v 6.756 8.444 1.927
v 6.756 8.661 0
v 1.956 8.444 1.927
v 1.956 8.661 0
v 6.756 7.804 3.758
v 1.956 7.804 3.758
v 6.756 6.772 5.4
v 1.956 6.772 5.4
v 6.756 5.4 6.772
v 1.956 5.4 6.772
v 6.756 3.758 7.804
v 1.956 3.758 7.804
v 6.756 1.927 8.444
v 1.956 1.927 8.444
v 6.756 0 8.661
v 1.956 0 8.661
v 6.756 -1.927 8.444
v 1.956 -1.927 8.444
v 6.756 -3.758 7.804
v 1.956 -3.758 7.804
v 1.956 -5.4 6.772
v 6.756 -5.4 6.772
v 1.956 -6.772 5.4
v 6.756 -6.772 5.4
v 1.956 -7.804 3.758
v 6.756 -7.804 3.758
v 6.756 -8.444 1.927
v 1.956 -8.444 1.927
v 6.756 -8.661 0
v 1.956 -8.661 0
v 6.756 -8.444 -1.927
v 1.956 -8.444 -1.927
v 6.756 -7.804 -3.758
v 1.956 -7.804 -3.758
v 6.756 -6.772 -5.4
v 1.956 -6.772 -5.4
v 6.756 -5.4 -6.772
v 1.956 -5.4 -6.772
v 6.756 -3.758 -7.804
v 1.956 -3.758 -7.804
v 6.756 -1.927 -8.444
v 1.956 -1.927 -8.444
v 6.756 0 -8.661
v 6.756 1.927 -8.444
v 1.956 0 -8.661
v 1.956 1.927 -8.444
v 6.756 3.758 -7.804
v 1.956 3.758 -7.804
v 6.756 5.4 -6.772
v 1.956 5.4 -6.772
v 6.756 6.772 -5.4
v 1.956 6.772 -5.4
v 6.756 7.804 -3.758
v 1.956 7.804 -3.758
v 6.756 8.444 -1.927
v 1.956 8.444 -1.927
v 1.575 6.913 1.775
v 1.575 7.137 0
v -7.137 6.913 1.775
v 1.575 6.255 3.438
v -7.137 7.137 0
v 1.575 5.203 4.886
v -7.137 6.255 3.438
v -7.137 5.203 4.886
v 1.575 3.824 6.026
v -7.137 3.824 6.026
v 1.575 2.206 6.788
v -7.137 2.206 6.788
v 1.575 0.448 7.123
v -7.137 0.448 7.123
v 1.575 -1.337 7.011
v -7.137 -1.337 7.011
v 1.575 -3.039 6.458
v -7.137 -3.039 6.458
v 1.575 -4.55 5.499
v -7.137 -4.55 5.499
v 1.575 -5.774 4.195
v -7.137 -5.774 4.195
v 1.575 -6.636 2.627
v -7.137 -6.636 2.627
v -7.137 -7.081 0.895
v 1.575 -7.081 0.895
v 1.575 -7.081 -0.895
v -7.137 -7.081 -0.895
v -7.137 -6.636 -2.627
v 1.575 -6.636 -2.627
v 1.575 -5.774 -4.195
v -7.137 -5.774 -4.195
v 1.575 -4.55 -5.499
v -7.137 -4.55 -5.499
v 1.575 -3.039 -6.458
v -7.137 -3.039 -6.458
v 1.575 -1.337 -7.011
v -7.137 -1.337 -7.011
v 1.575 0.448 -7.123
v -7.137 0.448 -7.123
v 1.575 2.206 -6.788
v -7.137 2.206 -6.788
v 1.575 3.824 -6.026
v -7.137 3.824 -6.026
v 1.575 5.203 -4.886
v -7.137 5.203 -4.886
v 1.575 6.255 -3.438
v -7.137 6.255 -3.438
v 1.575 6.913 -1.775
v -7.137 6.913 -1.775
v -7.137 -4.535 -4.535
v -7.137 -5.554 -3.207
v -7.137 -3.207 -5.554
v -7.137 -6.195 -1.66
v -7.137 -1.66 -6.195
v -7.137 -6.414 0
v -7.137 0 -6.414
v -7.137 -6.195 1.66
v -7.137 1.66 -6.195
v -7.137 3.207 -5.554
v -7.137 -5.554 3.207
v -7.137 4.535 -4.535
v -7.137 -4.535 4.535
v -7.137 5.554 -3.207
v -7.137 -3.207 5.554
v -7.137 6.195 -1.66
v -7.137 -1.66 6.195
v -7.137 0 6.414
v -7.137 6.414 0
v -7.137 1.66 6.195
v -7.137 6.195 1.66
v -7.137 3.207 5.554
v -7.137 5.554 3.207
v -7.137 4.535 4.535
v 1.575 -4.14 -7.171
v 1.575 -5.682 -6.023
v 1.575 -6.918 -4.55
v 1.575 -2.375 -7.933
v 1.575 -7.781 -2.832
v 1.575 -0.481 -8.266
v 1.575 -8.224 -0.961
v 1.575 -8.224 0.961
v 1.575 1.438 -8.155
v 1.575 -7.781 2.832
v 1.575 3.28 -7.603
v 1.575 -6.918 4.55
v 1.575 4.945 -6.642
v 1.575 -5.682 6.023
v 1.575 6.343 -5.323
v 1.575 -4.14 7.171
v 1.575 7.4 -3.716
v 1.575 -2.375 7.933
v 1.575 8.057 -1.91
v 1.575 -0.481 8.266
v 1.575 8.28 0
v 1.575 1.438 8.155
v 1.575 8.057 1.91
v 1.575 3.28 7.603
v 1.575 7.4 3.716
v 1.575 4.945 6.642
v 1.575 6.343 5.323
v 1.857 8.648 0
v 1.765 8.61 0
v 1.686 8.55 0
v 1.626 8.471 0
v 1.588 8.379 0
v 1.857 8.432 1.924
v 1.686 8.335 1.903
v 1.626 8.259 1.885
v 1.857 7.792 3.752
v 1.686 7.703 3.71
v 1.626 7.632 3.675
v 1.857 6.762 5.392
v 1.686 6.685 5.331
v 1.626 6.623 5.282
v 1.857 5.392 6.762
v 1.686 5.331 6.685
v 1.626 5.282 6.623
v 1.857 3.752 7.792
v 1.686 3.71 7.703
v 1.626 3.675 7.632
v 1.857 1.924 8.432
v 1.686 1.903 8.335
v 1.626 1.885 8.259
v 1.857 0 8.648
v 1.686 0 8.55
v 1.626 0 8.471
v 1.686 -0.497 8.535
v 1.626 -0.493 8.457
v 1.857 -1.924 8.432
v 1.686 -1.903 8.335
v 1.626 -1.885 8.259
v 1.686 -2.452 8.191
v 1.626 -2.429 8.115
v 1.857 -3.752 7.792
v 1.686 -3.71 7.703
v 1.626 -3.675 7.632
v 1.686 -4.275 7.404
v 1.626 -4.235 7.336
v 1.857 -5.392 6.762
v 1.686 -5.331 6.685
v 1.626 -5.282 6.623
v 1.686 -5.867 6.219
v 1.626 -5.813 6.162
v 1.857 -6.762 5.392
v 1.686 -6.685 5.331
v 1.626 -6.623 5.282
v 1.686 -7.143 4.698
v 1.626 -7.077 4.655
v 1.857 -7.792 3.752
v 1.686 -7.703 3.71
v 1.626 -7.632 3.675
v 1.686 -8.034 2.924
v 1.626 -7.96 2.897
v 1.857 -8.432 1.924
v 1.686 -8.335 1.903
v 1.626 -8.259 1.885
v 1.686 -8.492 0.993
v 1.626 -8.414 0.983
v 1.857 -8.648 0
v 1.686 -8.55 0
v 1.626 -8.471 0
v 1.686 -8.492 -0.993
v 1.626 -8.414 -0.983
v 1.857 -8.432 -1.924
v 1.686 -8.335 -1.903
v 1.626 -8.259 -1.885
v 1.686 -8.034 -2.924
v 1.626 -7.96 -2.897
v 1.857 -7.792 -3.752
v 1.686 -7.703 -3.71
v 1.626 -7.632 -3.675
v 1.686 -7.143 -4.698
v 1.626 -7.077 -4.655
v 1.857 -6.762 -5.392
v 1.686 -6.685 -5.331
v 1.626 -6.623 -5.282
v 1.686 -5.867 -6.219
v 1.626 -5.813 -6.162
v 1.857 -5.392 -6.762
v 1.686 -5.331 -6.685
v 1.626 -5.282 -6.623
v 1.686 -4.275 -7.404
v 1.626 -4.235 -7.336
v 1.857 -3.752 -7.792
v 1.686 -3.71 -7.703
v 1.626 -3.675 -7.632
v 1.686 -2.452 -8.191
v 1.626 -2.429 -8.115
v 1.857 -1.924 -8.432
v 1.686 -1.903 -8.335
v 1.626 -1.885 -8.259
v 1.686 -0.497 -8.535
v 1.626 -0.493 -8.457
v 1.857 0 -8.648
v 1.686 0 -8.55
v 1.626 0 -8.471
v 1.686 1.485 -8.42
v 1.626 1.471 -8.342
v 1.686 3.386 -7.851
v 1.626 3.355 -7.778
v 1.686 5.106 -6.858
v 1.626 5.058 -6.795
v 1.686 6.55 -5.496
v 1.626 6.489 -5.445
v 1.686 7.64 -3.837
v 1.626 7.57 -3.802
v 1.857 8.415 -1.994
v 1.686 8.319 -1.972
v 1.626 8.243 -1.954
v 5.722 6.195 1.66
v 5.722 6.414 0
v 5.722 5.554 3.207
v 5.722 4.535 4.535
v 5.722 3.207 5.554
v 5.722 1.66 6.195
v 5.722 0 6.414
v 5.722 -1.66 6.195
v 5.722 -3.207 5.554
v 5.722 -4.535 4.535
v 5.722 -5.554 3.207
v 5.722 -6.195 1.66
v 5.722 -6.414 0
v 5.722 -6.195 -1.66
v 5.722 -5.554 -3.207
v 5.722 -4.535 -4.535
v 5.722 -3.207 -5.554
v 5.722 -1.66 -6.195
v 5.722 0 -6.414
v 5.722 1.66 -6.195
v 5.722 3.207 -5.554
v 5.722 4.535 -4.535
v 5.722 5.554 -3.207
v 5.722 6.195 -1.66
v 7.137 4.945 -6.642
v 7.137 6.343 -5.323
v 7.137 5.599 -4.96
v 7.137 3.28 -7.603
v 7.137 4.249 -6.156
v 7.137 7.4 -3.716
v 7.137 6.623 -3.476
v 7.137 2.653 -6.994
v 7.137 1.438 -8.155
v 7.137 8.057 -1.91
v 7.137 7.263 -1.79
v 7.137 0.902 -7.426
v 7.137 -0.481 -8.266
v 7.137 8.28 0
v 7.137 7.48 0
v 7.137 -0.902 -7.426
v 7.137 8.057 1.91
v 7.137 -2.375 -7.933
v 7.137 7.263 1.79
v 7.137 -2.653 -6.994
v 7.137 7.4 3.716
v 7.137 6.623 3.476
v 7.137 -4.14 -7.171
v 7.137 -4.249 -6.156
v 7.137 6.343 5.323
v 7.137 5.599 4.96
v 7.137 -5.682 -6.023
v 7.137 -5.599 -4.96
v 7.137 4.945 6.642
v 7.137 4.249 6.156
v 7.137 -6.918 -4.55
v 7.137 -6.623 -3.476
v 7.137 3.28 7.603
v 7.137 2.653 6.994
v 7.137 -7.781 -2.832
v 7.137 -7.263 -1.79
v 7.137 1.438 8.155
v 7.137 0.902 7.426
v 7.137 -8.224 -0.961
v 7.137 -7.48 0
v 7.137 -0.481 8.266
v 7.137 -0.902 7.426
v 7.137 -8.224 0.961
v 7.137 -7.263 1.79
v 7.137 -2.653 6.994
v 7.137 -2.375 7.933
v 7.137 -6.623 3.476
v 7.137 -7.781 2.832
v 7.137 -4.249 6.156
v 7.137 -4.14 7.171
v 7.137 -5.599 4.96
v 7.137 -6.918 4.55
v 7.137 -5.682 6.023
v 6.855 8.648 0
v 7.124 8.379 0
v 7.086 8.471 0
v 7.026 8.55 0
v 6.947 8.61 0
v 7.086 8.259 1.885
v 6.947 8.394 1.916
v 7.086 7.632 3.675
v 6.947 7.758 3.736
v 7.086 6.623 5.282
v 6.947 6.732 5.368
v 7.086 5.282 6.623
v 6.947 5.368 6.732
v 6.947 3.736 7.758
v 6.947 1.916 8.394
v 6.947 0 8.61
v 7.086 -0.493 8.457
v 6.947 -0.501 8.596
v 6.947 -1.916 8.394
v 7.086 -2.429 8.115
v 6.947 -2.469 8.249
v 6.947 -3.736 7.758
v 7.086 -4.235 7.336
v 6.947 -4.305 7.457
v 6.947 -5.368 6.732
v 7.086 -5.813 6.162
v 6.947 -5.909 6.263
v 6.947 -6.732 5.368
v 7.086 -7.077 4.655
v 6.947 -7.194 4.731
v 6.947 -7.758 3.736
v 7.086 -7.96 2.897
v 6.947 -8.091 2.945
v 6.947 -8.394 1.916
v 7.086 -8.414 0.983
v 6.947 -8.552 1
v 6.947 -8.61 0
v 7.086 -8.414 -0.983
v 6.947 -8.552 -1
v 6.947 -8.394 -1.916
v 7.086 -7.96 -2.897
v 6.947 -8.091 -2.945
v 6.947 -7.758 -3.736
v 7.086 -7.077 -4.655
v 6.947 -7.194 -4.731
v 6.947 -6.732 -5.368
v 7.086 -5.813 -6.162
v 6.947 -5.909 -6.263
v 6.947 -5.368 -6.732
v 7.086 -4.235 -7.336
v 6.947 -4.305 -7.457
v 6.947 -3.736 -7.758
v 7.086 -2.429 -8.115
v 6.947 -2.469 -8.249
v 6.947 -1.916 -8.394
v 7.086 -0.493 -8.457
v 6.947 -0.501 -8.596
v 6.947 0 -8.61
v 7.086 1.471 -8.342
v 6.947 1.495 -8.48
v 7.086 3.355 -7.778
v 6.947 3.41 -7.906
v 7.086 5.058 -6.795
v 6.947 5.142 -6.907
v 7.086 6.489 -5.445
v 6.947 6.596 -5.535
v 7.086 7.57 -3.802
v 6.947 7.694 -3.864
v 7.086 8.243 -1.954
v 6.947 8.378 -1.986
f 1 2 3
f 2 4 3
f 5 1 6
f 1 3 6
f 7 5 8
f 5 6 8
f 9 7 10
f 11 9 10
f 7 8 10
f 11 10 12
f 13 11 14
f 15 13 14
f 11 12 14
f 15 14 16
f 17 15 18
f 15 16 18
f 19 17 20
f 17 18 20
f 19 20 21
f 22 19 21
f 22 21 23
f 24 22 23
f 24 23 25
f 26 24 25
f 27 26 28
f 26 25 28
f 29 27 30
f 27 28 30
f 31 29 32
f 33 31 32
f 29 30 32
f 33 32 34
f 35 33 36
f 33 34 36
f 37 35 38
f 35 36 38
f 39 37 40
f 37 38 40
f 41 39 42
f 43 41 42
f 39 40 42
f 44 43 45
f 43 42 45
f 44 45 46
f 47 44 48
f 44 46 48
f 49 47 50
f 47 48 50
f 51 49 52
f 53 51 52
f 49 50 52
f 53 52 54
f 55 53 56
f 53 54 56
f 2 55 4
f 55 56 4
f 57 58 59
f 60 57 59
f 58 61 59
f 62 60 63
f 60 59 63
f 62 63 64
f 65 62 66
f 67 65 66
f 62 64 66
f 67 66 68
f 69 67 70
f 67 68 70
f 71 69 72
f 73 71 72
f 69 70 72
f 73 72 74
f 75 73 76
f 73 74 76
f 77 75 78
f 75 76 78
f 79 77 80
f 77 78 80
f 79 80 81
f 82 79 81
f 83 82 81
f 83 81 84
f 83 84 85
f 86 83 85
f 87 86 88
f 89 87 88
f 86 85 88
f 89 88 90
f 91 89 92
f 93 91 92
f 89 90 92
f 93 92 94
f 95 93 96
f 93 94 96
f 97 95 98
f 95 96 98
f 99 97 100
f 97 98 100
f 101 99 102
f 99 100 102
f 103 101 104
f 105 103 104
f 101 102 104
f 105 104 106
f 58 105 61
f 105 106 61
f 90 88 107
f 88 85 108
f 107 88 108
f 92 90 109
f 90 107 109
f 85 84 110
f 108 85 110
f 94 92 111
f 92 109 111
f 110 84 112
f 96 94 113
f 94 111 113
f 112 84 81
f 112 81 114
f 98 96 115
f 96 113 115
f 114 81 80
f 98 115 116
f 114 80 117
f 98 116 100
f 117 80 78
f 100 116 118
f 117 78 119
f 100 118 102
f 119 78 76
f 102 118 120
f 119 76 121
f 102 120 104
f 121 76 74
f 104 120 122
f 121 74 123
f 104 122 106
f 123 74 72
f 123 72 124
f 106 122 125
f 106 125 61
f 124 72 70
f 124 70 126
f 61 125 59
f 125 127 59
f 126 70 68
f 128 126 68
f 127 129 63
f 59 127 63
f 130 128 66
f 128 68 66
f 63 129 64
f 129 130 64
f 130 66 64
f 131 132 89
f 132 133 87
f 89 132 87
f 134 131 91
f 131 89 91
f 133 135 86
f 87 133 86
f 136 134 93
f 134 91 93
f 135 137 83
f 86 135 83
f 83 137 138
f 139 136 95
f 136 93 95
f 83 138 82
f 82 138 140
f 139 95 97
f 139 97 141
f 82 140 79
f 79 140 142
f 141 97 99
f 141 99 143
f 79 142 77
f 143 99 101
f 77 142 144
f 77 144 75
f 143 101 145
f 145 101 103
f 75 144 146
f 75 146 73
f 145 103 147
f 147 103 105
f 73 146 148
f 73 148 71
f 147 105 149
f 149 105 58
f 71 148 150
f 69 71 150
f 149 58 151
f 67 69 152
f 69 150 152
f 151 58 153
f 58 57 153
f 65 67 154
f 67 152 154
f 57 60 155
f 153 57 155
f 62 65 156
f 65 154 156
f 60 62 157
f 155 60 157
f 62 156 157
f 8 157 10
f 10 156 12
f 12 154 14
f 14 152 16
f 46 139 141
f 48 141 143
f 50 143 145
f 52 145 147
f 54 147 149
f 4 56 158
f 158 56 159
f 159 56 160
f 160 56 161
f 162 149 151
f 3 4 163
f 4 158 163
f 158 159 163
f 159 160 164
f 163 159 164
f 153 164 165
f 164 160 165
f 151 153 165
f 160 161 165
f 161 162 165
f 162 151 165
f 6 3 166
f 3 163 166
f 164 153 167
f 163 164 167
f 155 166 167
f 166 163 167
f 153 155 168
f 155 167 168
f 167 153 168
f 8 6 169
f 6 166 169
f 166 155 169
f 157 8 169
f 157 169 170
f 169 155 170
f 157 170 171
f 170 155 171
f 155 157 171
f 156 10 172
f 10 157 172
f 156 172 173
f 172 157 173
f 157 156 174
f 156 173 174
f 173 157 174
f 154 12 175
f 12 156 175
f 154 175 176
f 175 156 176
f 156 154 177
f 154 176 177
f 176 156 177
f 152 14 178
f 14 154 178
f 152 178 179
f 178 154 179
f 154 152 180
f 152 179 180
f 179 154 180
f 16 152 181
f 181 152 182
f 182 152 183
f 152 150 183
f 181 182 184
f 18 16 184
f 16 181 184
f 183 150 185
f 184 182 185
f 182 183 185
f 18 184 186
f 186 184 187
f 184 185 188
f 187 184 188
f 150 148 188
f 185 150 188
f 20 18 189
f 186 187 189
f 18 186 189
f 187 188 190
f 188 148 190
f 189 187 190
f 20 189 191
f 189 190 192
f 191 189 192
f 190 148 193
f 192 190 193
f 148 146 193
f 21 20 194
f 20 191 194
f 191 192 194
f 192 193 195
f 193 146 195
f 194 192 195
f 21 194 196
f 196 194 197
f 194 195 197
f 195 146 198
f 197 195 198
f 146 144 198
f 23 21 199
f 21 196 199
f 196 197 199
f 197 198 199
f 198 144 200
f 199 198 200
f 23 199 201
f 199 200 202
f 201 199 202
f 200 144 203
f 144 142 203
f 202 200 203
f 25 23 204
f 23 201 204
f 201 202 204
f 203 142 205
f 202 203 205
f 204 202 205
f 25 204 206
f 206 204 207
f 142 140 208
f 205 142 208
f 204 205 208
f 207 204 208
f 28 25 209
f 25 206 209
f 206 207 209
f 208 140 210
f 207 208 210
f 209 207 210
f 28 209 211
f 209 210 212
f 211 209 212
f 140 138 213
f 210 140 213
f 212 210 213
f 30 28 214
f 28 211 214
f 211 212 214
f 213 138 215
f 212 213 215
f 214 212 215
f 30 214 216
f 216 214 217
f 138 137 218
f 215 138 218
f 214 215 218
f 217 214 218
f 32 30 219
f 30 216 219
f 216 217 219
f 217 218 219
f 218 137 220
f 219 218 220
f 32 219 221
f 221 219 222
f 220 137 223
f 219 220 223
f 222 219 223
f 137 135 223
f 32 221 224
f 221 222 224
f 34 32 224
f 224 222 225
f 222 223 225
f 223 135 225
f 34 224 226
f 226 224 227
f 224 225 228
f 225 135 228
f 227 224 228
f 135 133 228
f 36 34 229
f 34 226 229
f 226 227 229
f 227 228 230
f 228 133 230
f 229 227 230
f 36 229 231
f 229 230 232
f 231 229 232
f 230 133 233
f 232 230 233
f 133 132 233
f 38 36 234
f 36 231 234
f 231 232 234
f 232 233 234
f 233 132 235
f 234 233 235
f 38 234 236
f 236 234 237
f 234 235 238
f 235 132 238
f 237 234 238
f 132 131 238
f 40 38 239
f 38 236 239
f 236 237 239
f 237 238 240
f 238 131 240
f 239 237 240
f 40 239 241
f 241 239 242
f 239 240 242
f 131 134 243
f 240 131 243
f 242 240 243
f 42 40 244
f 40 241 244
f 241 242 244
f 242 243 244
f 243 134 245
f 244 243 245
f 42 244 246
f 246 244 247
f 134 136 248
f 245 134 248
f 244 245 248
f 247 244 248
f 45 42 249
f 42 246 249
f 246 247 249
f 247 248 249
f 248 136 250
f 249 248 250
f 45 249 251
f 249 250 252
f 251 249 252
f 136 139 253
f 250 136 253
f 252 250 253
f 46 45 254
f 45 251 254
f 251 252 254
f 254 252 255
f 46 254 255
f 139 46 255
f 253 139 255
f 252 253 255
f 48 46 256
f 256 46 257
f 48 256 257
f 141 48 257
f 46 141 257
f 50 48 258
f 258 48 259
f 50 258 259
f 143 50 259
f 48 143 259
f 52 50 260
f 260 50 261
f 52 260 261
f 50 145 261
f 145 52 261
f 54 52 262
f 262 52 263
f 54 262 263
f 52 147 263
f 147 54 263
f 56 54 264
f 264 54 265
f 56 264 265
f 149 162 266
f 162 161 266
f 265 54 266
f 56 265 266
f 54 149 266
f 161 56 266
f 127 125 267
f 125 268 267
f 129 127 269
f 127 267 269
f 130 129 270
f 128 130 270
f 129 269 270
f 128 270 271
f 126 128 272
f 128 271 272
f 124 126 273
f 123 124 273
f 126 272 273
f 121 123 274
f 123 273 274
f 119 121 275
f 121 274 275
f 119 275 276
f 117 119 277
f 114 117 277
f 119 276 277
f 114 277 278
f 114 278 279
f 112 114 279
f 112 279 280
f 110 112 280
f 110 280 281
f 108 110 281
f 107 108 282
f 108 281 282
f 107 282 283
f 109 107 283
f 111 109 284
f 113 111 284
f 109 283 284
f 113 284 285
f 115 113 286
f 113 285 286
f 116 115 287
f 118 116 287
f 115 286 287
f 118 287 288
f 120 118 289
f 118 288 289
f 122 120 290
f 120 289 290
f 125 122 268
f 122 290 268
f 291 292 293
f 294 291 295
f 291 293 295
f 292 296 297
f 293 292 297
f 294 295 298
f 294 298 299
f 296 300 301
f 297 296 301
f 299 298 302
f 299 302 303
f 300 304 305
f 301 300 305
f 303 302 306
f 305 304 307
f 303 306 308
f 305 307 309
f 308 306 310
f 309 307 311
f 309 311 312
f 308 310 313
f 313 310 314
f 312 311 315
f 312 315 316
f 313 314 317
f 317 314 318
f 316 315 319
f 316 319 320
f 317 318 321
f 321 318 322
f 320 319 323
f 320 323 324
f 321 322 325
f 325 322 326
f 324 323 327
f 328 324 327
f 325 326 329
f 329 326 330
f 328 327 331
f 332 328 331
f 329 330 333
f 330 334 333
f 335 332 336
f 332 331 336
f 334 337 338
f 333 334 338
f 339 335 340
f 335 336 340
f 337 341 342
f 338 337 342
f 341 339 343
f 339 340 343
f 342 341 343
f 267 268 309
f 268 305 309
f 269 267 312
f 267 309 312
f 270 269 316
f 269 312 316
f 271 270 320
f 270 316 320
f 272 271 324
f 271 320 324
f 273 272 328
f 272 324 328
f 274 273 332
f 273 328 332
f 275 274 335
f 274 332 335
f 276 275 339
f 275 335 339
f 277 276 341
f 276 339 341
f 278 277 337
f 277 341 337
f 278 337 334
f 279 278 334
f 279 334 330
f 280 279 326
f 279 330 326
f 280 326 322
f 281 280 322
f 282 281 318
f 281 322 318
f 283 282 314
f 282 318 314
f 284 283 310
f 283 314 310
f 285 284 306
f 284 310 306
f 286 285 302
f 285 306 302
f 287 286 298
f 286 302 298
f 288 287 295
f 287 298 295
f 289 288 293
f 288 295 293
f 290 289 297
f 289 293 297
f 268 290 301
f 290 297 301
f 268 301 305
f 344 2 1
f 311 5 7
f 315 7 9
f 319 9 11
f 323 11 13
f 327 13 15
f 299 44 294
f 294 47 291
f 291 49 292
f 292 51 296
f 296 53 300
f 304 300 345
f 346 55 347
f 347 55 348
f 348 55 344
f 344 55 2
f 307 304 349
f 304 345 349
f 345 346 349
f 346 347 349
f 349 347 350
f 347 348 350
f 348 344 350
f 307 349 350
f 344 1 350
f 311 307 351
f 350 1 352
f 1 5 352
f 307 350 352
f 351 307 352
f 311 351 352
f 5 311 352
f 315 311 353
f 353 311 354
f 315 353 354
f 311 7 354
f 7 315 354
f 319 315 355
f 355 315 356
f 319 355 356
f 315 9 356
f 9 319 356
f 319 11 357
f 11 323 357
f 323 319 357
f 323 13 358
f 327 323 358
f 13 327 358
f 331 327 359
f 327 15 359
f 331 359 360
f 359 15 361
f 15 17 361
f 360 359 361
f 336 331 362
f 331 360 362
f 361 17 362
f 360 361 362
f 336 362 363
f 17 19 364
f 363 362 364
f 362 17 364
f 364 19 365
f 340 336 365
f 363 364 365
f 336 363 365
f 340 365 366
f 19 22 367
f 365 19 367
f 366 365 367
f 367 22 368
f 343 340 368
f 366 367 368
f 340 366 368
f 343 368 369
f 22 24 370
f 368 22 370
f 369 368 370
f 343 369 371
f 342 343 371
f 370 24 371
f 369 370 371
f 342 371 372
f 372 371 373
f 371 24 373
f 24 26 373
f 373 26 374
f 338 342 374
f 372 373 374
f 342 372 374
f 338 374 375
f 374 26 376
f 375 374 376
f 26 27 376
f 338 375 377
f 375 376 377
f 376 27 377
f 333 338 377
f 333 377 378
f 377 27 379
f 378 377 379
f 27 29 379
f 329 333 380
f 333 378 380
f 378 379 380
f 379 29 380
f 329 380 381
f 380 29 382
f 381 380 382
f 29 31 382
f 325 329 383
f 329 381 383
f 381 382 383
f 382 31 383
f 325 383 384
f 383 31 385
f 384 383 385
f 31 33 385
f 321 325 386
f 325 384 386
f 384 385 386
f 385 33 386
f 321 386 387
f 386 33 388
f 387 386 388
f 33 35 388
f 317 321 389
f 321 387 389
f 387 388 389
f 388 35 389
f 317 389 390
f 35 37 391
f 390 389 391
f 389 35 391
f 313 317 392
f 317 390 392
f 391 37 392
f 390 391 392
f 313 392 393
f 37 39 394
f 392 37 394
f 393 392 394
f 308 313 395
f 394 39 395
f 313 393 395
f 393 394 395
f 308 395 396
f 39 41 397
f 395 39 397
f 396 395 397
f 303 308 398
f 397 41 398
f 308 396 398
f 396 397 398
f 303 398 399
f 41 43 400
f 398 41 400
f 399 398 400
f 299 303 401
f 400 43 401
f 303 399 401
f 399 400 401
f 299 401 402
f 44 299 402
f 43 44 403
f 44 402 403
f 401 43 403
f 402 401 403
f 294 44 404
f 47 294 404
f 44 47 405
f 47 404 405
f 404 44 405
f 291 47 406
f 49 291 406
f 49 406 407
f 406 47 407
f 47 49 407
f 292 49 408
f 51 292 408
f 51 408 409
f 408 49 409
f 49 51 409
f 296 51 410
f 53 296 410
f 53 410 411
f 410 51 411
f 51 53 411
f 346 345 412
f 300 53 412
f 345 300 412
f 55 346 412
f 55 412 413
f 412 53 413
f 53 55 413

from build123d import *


with BuildPart() as part:
    # Sketch1 → Revolve1 (revolve)
    with BuildSketch(Plane.XY):
        with BuildLine():
            Line((-7.1374, 6.4135), (5.721708584, 6.4135))
            Line((5.721708584, 6.4135), (7.1374, 7.4803))
            Line((7.1374, 7.4803), (7.1374, 8.2804))
            ThreePointArc((7.1374, 8.2804), (7.025807684, 8.549807684), (6.7564, 8.6614))
            Line((6.7564, 8.6614), (1.9558, 8.6614))
            ThreePointArc((1.9558, 8.6614), (1.686392316, 8.549807684), (1.5748, 8.2804))
            Line((1.5748, 8.2804), (1.5748, 7.1374))
            Line((1.5748, 7.1374), (-7.1374, 7.1374))
            Line((-7.1374, 7.1374), (-7.1374, 6.4135))
        make_face()
    revolve(axis=Axis((-7.1374, 0, 0), (1, 0, 0)))


solid = part.part
